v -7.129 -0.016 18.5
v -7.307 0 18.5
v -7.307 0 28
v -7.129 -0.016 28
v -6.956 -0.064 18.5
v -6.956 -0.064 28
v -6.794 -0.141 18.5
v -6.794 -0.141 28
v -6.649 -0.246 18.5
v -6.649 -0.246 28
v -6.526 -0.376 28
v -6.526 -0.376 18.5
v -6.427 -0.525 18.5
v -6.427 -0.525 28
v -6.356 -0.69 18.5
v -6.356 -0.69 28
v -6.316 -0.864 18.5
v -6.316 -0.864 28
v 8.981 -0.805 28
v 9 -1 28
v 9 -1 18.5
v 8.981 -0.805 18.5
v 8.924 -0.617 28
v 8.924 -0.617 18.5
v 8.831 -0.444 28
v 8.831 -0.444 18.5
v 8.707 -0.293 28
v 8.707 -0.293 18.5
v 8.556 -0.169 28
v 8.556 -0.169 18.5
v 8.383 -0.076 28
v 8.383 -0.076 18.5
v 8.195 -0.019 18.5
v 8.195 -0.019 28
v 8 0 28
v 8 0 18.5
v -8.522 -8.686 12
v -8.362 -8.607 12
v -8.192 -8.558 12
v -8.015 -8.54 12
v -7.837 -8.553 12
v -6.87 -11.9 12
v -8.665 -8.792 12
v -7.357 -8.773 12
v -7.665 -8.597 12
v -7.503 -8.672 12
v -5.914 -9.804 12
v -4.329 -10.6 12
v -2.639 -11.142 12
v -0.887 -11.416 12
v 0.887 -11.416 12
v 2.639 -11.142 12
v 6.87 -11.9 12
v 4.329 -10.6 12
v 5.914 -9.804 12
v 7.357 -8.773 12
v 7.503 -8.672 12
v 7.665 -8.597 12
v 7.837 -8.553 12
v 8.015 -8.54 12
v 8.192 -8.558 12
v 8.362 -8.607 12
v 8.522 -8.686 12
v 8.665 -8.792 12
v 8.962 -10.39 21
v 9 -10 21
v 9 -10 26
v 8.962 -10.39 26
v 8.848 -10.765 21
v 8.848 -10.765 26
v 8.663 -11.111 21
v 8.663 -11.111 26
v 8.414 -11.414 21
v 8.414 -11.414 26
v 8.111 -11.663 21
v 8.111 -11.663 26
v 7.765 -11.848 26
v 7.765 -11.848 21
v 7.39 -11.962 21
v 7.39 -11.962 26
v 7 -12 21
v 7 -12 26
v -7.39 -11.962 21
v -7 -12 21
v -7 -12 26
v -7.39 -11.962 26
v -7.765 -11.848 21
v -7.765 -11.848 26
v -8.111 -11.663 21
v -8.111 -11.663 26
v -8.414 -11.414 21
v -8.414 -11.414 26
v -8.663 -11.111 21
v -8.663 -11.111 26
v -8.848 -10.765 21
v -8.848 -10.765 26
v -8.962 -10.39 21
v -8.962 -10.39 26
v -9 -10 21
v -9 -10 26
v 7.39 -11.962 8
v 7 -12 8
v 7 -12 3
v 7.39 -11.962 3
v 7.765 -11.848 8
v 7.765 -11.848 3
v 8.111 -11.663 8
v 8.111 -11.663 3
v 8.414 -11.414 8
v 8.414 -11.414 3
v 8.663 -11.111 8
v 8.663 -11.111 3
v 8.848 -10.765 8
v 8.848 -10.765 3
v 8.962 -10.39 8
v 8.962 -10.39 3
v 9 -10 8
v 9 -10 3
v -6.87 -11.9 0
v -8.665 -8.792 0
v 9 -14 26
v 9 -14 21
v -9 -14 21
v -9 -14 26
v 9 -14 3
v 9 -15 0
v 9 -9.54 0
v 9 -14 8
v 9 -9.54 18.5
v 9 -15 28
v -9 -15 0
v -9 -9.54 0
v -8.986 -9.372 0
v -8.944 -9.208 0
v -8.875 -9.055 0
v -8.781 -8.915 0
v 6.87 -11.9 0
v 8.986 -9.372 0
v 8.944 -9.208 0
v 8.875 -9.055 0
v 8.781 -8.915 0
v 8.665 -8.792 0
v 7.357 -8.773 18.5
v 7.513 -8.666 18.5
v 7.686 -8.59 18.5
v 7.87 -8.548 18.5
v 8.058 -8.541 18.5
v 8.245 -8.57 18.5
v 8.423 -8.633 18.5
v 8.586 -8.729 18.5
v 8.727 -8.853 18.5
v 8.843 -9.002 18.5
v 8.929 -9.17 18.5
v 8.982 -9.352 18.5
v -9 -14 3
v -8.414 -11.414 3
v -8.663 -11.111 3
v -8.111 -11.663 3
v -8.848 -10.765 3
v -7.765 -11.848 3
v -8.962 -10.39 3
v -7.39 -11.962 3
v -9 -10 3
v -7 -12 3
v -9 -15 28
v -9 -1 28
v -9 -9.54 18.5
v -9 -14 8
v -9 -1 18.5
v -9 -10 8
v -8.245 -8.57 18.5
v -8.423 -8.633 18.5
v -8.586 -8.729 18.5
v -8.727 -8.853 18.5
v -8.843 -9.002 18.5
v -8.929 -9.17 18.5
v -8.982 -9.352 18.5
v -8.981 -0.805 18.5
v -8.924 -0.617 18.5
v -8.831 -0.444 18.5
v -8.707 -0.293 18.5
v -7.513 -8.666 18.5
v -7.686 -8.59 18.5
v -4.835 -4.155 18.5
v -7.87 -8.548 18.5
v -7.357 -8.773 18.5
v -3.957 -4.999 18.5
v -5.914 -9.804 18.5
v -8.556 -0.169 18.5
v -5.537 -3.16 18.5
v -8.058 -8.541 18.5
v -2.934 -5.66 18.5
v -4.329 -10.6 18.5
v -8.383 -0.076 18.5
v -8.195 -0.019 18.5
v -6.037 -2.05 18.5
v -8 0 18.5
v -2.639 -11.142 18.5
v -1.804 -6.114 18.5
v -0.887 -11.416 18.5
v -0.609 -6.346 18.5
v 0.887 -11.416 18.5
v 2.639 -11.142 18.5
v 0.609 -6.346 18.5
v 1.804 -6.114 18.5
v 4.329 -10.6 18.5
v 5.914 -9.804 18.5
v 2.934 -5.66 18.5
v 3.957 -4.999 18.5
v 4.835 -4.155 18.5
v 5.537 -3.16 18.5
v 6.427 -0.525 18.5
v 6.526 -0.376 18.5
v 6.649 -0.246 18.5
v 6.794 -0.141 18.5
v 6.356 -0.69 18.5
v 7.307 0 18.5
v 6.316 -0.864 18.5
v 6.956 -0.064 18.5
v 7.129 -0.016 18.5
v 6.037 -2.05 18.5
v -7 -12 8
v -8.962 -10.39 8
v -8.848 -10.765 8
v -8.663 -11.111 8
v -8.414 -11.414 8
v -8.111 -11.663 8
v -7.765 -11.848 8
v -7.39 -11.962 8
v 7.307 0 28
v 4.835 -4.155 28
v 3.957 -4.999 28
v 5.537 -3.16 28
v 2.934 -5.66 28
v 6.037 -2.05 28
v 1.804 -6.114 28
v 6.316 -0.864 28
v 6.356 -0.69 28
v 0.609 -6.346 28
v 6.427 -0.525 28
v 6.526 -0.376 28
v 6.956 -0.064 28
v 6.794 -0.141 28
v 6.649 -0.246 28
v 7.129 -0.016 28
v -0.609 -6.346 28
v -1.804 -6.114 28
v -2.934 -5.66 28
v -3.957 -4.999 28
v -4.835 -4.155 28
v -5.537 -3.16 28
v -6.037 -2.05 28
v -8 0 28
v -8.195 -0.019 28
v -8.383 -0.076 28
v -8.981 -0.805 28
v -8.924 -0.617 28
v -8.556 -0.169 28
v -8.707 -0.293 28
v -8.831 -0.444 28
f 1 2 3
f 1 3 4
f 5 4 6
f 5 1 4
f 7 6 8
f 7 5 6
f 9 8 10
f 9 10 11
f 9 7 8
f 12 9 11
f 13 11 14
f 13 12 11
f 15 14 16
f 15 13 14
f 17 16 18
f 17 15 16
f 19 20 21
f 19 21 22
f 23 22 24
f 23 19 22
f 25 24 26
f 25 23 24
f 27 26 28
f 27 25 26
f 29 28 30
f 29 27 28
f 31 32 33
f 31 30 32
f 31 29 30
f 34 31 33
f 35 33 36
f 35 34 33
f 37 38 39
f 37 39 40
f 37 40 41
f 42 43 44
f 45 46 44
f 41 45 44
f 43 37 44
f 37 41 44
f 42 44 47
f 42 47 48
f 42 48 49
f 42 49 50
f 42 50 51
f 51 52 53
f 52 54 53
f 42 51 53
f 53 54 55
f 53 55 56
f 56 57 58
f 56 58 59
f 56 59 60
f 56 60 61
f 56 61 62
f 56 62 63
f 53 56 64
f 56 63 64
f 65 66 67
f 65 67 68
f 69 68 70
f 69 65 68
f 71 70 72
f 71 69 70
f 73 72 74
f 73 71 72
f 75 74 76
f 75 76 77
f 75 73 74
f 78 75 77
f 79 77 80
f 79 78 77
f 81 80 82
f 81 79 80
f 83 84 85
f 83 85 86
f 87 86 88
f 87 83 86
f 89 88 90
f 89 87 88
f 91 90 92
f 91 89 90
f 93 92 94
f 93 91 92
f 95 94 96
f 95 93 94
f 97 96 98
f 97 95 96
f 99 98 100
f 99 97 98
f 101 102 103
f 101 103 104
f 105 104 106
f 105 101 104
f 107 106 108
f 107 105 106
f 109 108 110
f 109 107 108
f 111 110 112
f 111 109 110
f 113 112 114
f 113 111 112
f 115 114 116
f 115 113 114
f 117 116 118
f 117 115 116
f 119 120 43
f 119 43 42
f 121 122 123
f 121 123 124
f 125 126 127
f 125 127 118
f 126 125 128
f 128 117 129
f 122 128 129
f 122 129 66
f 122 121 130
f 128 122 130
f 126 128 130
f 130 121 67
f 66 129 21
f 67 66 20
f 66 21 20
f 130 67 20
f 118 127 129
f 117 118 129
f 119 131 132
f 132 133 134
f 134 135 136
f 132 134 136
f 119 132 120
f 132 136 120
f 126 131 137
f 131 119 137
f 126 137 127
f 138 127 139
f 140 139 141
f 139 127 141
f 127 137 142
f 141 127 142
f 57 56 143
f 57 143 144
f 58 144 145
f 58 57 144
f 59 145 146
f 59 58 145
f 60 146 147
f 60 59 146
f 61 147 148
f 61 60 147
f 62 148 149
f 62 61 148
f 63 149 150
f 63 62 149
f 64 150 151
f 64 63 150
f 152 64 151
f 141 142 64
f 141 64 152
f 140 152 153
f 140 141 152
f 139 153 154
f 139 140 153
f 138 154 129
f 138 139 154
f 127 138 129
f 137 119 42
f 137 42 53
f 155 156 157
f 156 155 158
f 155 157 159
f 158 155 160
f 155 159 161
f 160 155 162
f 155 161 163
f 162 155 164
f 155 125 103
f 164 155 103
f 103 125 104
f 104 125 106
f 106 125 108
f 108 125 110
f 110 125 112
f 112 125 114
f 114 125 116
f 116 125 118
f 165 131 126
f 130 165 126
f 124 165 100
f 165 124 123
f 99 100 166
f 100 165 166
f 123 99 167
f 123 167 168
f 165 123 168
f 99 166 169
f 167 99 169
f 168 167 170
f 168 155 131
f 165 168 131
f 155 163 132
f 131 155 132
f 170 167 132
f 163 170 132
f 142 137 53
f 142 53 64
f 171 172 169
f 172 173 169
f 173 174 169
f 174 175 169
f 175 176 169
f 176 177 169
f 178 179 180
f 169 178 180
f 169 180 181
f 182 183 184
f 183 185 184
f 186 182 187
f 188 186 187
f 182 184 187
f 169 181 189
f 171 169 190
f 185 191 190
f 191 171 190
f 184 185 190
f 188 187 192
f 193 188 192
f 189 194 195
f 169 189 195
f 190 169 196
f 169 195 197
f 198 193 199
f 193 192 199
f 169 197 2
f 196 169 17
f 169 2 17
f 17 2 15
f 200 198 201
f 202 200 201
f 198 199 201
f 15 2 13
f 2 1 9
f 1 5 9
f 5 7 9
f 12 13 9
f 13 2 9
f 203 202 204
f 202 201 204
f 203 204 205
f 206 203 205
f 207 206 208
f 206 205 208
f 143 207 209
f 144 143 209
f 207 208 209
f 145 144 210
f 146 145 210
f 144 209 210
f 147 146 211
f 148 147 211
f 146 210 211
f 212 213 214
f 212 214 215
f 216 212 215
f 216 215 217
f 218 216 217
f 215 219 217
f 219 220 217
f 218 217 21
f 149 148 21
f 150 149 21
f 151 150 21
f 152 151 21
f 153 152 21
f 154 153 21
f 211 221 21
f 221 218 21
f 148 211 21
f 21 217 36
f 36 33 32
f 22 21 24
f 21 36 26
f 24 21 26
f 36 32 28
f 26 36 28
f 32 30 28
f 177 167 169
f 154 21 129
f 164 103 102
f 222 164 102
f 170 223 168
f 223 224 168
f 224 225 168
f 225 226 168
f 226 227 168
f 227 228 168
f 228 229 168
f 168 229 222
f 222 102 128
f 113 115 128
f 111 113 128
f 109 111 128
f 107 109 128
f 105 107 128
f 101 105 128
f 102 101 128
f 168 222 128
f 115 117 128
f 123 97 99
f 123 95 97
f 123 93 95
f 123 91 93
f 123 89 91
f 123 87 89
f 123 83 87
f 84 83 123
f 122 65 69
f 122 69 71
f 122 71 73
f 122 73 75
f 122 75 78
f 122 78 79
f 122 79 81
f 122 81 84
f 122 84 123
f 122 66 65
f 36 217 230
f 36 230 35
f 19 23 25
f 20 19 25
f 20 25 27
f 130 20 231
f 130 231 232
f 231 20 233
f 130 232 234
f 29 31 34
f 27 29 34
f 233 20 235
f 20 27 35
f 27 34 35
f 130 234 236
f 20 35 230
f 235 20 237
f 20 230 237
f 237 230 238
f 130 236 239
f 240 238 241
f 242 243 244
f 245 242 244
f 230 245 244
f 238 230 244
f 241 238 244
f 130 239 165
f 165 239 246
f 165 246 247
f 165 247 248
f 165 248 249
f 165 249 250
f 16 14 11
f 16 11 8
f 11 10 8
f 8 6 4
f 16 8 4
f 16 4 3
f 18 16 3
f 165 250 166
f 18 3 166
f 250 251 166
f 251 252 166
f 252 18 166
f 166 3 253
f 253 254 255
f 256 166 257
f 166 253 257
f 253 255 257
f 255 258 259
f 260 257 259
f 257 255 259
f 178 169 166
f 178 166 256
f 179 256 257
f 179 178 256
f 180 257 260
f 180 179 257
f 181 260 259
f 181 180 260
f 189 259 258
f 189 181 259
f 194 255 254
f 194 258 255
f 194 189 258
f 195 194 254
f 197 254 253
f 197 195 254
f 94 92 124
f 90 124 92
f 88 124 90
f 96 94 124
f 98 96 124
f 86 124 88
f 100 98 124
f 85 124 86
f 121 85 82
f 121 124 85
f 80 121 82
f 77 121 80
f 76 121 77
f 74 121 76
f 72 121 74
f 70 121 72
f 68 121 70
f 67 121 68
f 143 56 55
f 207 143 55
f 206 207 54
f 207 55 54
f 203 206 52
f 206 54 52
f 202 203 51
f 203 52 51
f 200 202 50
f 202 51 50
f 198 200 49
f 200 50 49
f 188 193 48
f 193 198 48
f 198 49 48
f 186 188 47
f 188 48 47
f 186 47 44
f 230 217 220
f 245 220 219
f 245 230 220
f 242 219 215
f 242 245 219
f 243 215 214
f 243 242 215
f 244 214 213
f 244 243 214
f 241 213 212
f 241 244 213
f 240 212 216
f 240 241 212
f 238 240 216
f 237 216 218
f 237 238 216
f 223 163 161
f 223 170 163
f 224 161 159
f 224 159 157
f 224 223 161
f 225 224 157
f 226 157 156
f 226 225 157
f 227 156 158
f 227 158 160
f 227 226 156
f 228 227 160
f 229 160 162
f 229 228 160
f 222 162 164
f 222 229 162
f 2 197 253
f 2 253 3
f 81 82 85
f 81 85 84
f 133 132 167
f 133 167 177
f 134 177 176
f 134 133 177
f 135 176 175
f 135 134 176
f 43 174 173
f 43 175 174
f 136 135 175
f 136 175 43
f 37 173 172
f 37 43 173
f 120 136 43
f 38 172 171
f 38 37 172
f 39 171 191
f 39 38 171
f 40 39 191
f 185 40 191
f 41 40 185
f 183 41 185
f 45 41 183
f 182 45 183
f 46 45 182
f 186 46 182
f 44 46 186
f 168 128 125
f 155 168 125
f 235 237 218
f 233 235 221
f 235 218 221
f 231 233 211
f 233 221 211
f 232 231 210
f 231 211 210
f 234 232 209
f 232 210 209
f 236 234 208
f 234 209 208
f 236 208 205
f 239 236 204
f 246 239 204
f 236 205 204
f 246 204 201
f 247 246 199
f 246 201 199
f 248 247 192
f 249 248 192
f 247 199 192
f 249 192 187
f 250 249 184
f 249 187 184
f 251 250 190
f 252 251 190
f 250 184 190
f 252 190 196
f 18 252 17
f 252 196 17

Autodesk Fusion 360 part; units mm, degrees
sketch "Sketch1" plane through (0, 0, 0) normal (0, 0, 1) x (1, 0, 0)
  circle A0 centre (0, 0) radius 11.45
  line L0 (-6.8705, 11.9) -> (-13.7409, 0)
  line L1 (-13.7409, 0) -> (-6.8705, -11.9)
  line L2 (-6.8705, -11.9) -> (6.8705, -11.9)
  line L3 (6.8705, -11.9) -> (13.7409, 0)
  line L4 (13.7409, 0) -> (6.8705, 11.9)
  line L5 (6.8705, 11.9) -> (-6.8705, 11.9)
  line L6 (-4.6188, 8) -> (-9.2376, 0)
  line L7 (-9.2376, 0) -> (-4.6188, -8)
  line L8 (-4.6188, -8) -> (4.6188, -8)
  line L9 (4.6188, -8) -> (9.2376, 0)
  line L10 (9.2376, 0) -> (4.6188, 8)
  line L11 (4.6188, 8) -> (-4.6188, 8)
  circle A1 centre (0, 0) radius 6.375
  dimension "d2" = 22.9
  dimension "d3" = 11.9
  dimension "d15" = 8
  dimension "d24" = 12.75
extrude "Extrude2" add sketch "Sketch1" along normal blind 12 contours A0 | L0 L1 L2 L3 L4 L5 | L6 L7 L8 L9 L10 L11 | A1 makes body 1
extrude "Extrude3" add sketch "Sketch1" along normal blind 6.5 from surface at 12 contours A0 | L6 L7 L8 L9 L10 L11 | A1 bodies 1
extrude "Extrude4" add sketch "Sketch1" along normal blind 10 from surface at 18.5 contours A1 bodies 1
sketch "Sketch2" plane through (0, 0, 0) normal (0, 1, 0) x (1, 0, 0)
  line L0 (-9, 0) -> (9, 0)
  line L1 (9, 0) -> (9, -28)
  line L2 (9, -28) -> (-9, -28)
  line L3 (-9, -28) -> (-9, 0)
  dimension "d25" = 28
extrude "Extrude5" add sketch "Sketch2" against normal blind 15 separate body makes body 2
combine "Combine1" operation cut target body 2 tool bodies 1 keep tools
sketch "Sketch3" plane through (9, 0, 0) normal (1, 0, 0) x (0, 1, 0)
  line L0 (0, 28) -> (-15, 28)
  line L1 (-15, 28) -> (-15, 0)
  line L2 (-15, 0) -> (-8.2115, 0)
  line L3 (-14, 26) -> (-12, 26)
  line L4 (-12, 26) -> (-12, 21)
  line L5 (-12, 21) -> (-14, 21)
  line L6 (-14, 21) -> (-14, 26)
  line L7 (-14, 3) -> (-12, 3)
  line L8 (-12, 3) -> (-12, 8)
  line L9 (-12, 8) -> (-14, 8)
  line L10 (-14, 8) -> (-14, 3)
  line L11 (-7.0783, 12) -> (-7.0783, 18.5)
  line L12 (-8.2115, 0) -> (-8.2115, 12)
  line L13 (-8.2115, 12) -> (-7.0783, 12)
  line L14 (-7.0783, 18.5) -> (0, 18.5)
  line L15 (0, 18.5) -> (0, 28)
  dimension "d28" = 2
  dimension "d29" = 5
  dimension "d30" = 2
  dimension "d31" = 5
  dimension "d32" = 3
  dimension "d33" = 2
extrude "Extrude6" cut sketch "Sketch3" against normal blind 28 contours L3 L4 L5 L6 | L7 L8 L9 L10 bodies 2
fillet "Fillet1" radius 2 4 edges at (9, -12, 23.5) (9, -12, 5.5) (-9, -12, 23.5) (-9, -12, 5.5) on bodies 2
fillet "Fillet2" radius 1 8 edges at (-9, -7.0783, 15.25) (-9, -8.2115, 6) (9, -8.2115, 6) (9, -7.0783, 15.25) (-6.375, 0, 23.25) (-9, 0, 23.25) (6.375, 0, 23.25) (9, 0, 23.25) on bodies 2
hidden bodies 1
equation "d3 = 23.8 mm / 2"
equation "d9 = 18.5 mm - 12 mm"
equation "d30 = d28"
equation "d31 = d29"
equation "d33 = d28"
